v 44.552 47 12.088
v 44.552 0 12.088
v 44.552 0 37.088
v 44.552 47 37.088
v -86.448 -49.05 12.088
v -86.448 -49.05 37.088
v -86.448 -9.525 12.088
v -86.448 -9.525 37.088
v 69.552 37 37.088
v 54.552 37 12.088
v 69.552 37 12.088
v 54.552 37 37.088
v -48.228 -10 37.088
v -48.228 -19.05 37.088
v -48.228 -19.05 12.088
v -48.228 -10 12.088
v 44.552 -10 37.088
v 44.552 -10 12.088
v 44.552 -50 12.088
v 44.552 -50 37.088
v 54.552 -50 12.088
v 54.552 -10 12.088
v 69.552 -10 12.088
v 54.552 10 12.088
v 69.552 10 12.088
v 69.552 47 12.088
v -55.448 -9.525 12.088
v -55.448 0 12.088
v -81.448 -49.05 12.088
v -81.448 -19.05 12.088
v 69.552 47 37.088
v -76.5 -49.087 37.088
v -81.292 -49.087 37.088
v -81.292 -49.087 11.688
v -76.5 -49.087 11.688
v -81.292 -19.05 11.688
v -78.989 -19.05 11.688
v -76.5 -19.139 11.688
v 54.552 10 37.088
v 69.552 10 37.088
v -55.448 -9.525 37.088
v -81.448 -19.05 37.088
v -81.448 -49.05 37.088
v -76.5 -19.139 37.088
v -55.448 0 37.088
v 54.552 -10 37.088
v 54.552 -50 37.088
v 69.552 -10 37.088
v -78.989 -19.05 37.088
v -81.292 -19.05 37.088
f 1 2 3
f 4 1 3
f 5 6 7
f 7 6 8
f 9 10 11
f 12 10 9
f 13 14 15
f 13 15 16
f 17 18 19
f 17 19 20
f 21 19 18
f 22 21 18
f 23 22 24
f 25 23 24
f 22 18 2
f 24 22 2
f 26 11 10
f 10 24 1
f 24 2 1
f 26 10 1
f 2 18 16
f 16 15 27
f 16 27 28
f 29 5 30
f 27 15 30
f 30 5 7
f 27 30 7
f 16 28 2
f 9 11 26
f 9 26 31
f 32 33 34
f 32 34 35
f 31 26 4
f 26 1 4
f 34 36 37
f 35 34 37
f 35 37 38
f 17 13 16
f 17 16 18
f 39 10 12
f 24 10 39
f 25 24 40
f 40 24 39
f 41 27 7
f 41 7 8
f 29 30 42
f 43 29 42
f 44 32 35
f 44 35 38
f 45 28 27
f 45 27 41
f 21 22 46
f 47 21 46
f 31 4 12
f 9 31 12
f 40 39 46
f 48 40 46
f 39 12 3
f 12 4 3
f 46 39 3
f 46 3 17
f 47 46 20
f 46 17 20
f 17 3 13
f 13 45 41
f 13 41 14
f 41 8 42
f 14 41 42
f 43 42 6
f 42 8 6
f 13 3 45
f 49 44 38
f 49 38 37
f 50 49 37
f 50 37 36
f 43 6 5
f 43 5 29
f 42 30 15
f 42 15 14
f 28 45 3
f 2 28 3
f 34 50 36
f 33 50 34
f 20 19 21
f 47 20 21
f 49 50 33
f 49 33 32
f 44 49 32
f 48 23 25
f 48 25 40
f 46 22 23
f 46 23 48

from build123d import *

# Parameters (mm, degrees)
F0_W      = 115
F0_H      = 25
F1_DEPTH  = 10
F2_W      = 10
F2_H      = 25
F3_DEPTH  = 9.05
F4_W      = 10
F4_H      = 25
F5_DEPTH  = 40
F6_W      = 15
F6_H      = 25
F7_DEPTH  = 47
F8_W      = 5
F8_H      = 27
F9_DEPTH  = 25
F10_W     = 9.525
F10_H     = 25
F11_DEPTH = 36
F12_W     = 10
F12_H     = 25
F13_DEPTH = 30
F14_DEPTH = 10
F15_DEPTH = 10
F16_W     = 2.78
F16_H     = 9.05
F17_DEPTH = 25
F18_W     = 5
F18_H     = 39.525
F20_DEPTH = 25
F21_DEPTH = 25.4


with BuildPart() as f1:
    # F0 (on Front) → F1 (new body)
    with BuildSketch(Plane.XZ):
        with Locations((2.0515378565, 24.5875327226)):
            Rectangle(F0_W, F0_H)
    extrude(amount=F1_DEPTH)

    # F2 (on face) → F3 (join)
    with BuildSketch(Plane.XZ.offset(10)):
        with Locations((-50.4484621435, 24.5875327226)):
            Rectangle(F2_W, F2_H)
    extrude(amount=F3_DEPTH)

    # F4 (on face) → F5 (join)
    with BuildSketch(Plane.XZ.offset(10)):
        with Locations((49.5515378565, 24.5875327226)):
            Rectangle(F4_W, F4_H)
    extrude(amount=F5_DEPTH)

    # F6 (on face) → F7 (join)
    with BuildSketch(Plane(origin=(0, 0, 0), x_dir=(-1, 0, 0), z_dir=(0, 1, 0))):
        with Locations((-52.0515378565, 24.5875327226)):
            Rectangle(F6_W, F6_H)
    extrude(amount=F7_DEPTH)

    # F8 (on face) → F9 (cut)
    with BuildSketch(Plane(origin=(0, 0, 12.0875327226), x_dir=(1, 0, 0), z_dir=(0, 0, -1))):
        with Locations((57.0515378565, -23.5)):
            Rectangle(F8_W, F8_H)
    extrude(amount=-F9_DEPTH, mode=Mode.SUBTRACT)

    # F10 (on face) → F11 (join)
    with BuildSketch(Plane(origin=(-55.4484621435, 0, 0), x_dir=(0, -1, 0), z_dir=(-1, 0, 0))):
        with Locations((14.2875, 24.5875327226)):
            Rectangle(F10_W, F10_H)
    extrude(amount=F11_DEPTH)

    # F12 (on face) → F13 (join)
    with BuildSketch(Plane.XZ.offset(19.05)):
        with Locations((-86.4484621435, 24.5875327226)):
            Rectangle(F12_W, F12_H)
    extrude(amount=F13_DEPTH)

    # F14 (add): a face of the model
    f14_faces = [f1.faces().sort_by_distance(p)[0] for p in [
        (59.5515378565, 0, 24.5875327226),
    ]]
    extrude(f14_faces, amount=F14_DEPTH)

    # F15 (add): a face of the model
    f15_faces = [f1.faces().sort_by_distance(p)[0] for p in [
        (59.5515378565, 42, 24.5875327226),
    ]]
    extrude(f15_faces, amount=F15_DEPTH)

    # F16 (on face) → F17 (cut)
    with BuildSketch(Plane.XY.offset(37.0875327226)):
        with Locations((-46.8384621435, -14.525)):
            Rectangle(F16_W, F16_H)
    extrude(amount=-F17_DEPTH, mode=Mode.SUBTRACT)

    # F18 (on face) → F20 (cut)
    with BuildSketch(Plane.XY.offset(37.0875327226)):
        with Locations((-88.9484621435, -29.2875)):
            Rectangle(F18_W, F18_H)
    extrude(amount=-F20_DEPTH, mode=Mode.SUBTRACT)


with BuildPart() as f21:
    # F19 (on face) → F21 (new body)
    with BuildSketch(Plane.XY.offset(37.0875327226)):
        Polygon((-76.4999240637, -49.0866973996), (-76.4999240637, -19.1388912499), (-78.9888751906, -19.05), (-81.2915712595, -19.05), (-81.2915712595, -49.0866973996), align=None)
    extrude(amount=-F21_DEPTH)


solid = Compound([f1.part, f21.part])
